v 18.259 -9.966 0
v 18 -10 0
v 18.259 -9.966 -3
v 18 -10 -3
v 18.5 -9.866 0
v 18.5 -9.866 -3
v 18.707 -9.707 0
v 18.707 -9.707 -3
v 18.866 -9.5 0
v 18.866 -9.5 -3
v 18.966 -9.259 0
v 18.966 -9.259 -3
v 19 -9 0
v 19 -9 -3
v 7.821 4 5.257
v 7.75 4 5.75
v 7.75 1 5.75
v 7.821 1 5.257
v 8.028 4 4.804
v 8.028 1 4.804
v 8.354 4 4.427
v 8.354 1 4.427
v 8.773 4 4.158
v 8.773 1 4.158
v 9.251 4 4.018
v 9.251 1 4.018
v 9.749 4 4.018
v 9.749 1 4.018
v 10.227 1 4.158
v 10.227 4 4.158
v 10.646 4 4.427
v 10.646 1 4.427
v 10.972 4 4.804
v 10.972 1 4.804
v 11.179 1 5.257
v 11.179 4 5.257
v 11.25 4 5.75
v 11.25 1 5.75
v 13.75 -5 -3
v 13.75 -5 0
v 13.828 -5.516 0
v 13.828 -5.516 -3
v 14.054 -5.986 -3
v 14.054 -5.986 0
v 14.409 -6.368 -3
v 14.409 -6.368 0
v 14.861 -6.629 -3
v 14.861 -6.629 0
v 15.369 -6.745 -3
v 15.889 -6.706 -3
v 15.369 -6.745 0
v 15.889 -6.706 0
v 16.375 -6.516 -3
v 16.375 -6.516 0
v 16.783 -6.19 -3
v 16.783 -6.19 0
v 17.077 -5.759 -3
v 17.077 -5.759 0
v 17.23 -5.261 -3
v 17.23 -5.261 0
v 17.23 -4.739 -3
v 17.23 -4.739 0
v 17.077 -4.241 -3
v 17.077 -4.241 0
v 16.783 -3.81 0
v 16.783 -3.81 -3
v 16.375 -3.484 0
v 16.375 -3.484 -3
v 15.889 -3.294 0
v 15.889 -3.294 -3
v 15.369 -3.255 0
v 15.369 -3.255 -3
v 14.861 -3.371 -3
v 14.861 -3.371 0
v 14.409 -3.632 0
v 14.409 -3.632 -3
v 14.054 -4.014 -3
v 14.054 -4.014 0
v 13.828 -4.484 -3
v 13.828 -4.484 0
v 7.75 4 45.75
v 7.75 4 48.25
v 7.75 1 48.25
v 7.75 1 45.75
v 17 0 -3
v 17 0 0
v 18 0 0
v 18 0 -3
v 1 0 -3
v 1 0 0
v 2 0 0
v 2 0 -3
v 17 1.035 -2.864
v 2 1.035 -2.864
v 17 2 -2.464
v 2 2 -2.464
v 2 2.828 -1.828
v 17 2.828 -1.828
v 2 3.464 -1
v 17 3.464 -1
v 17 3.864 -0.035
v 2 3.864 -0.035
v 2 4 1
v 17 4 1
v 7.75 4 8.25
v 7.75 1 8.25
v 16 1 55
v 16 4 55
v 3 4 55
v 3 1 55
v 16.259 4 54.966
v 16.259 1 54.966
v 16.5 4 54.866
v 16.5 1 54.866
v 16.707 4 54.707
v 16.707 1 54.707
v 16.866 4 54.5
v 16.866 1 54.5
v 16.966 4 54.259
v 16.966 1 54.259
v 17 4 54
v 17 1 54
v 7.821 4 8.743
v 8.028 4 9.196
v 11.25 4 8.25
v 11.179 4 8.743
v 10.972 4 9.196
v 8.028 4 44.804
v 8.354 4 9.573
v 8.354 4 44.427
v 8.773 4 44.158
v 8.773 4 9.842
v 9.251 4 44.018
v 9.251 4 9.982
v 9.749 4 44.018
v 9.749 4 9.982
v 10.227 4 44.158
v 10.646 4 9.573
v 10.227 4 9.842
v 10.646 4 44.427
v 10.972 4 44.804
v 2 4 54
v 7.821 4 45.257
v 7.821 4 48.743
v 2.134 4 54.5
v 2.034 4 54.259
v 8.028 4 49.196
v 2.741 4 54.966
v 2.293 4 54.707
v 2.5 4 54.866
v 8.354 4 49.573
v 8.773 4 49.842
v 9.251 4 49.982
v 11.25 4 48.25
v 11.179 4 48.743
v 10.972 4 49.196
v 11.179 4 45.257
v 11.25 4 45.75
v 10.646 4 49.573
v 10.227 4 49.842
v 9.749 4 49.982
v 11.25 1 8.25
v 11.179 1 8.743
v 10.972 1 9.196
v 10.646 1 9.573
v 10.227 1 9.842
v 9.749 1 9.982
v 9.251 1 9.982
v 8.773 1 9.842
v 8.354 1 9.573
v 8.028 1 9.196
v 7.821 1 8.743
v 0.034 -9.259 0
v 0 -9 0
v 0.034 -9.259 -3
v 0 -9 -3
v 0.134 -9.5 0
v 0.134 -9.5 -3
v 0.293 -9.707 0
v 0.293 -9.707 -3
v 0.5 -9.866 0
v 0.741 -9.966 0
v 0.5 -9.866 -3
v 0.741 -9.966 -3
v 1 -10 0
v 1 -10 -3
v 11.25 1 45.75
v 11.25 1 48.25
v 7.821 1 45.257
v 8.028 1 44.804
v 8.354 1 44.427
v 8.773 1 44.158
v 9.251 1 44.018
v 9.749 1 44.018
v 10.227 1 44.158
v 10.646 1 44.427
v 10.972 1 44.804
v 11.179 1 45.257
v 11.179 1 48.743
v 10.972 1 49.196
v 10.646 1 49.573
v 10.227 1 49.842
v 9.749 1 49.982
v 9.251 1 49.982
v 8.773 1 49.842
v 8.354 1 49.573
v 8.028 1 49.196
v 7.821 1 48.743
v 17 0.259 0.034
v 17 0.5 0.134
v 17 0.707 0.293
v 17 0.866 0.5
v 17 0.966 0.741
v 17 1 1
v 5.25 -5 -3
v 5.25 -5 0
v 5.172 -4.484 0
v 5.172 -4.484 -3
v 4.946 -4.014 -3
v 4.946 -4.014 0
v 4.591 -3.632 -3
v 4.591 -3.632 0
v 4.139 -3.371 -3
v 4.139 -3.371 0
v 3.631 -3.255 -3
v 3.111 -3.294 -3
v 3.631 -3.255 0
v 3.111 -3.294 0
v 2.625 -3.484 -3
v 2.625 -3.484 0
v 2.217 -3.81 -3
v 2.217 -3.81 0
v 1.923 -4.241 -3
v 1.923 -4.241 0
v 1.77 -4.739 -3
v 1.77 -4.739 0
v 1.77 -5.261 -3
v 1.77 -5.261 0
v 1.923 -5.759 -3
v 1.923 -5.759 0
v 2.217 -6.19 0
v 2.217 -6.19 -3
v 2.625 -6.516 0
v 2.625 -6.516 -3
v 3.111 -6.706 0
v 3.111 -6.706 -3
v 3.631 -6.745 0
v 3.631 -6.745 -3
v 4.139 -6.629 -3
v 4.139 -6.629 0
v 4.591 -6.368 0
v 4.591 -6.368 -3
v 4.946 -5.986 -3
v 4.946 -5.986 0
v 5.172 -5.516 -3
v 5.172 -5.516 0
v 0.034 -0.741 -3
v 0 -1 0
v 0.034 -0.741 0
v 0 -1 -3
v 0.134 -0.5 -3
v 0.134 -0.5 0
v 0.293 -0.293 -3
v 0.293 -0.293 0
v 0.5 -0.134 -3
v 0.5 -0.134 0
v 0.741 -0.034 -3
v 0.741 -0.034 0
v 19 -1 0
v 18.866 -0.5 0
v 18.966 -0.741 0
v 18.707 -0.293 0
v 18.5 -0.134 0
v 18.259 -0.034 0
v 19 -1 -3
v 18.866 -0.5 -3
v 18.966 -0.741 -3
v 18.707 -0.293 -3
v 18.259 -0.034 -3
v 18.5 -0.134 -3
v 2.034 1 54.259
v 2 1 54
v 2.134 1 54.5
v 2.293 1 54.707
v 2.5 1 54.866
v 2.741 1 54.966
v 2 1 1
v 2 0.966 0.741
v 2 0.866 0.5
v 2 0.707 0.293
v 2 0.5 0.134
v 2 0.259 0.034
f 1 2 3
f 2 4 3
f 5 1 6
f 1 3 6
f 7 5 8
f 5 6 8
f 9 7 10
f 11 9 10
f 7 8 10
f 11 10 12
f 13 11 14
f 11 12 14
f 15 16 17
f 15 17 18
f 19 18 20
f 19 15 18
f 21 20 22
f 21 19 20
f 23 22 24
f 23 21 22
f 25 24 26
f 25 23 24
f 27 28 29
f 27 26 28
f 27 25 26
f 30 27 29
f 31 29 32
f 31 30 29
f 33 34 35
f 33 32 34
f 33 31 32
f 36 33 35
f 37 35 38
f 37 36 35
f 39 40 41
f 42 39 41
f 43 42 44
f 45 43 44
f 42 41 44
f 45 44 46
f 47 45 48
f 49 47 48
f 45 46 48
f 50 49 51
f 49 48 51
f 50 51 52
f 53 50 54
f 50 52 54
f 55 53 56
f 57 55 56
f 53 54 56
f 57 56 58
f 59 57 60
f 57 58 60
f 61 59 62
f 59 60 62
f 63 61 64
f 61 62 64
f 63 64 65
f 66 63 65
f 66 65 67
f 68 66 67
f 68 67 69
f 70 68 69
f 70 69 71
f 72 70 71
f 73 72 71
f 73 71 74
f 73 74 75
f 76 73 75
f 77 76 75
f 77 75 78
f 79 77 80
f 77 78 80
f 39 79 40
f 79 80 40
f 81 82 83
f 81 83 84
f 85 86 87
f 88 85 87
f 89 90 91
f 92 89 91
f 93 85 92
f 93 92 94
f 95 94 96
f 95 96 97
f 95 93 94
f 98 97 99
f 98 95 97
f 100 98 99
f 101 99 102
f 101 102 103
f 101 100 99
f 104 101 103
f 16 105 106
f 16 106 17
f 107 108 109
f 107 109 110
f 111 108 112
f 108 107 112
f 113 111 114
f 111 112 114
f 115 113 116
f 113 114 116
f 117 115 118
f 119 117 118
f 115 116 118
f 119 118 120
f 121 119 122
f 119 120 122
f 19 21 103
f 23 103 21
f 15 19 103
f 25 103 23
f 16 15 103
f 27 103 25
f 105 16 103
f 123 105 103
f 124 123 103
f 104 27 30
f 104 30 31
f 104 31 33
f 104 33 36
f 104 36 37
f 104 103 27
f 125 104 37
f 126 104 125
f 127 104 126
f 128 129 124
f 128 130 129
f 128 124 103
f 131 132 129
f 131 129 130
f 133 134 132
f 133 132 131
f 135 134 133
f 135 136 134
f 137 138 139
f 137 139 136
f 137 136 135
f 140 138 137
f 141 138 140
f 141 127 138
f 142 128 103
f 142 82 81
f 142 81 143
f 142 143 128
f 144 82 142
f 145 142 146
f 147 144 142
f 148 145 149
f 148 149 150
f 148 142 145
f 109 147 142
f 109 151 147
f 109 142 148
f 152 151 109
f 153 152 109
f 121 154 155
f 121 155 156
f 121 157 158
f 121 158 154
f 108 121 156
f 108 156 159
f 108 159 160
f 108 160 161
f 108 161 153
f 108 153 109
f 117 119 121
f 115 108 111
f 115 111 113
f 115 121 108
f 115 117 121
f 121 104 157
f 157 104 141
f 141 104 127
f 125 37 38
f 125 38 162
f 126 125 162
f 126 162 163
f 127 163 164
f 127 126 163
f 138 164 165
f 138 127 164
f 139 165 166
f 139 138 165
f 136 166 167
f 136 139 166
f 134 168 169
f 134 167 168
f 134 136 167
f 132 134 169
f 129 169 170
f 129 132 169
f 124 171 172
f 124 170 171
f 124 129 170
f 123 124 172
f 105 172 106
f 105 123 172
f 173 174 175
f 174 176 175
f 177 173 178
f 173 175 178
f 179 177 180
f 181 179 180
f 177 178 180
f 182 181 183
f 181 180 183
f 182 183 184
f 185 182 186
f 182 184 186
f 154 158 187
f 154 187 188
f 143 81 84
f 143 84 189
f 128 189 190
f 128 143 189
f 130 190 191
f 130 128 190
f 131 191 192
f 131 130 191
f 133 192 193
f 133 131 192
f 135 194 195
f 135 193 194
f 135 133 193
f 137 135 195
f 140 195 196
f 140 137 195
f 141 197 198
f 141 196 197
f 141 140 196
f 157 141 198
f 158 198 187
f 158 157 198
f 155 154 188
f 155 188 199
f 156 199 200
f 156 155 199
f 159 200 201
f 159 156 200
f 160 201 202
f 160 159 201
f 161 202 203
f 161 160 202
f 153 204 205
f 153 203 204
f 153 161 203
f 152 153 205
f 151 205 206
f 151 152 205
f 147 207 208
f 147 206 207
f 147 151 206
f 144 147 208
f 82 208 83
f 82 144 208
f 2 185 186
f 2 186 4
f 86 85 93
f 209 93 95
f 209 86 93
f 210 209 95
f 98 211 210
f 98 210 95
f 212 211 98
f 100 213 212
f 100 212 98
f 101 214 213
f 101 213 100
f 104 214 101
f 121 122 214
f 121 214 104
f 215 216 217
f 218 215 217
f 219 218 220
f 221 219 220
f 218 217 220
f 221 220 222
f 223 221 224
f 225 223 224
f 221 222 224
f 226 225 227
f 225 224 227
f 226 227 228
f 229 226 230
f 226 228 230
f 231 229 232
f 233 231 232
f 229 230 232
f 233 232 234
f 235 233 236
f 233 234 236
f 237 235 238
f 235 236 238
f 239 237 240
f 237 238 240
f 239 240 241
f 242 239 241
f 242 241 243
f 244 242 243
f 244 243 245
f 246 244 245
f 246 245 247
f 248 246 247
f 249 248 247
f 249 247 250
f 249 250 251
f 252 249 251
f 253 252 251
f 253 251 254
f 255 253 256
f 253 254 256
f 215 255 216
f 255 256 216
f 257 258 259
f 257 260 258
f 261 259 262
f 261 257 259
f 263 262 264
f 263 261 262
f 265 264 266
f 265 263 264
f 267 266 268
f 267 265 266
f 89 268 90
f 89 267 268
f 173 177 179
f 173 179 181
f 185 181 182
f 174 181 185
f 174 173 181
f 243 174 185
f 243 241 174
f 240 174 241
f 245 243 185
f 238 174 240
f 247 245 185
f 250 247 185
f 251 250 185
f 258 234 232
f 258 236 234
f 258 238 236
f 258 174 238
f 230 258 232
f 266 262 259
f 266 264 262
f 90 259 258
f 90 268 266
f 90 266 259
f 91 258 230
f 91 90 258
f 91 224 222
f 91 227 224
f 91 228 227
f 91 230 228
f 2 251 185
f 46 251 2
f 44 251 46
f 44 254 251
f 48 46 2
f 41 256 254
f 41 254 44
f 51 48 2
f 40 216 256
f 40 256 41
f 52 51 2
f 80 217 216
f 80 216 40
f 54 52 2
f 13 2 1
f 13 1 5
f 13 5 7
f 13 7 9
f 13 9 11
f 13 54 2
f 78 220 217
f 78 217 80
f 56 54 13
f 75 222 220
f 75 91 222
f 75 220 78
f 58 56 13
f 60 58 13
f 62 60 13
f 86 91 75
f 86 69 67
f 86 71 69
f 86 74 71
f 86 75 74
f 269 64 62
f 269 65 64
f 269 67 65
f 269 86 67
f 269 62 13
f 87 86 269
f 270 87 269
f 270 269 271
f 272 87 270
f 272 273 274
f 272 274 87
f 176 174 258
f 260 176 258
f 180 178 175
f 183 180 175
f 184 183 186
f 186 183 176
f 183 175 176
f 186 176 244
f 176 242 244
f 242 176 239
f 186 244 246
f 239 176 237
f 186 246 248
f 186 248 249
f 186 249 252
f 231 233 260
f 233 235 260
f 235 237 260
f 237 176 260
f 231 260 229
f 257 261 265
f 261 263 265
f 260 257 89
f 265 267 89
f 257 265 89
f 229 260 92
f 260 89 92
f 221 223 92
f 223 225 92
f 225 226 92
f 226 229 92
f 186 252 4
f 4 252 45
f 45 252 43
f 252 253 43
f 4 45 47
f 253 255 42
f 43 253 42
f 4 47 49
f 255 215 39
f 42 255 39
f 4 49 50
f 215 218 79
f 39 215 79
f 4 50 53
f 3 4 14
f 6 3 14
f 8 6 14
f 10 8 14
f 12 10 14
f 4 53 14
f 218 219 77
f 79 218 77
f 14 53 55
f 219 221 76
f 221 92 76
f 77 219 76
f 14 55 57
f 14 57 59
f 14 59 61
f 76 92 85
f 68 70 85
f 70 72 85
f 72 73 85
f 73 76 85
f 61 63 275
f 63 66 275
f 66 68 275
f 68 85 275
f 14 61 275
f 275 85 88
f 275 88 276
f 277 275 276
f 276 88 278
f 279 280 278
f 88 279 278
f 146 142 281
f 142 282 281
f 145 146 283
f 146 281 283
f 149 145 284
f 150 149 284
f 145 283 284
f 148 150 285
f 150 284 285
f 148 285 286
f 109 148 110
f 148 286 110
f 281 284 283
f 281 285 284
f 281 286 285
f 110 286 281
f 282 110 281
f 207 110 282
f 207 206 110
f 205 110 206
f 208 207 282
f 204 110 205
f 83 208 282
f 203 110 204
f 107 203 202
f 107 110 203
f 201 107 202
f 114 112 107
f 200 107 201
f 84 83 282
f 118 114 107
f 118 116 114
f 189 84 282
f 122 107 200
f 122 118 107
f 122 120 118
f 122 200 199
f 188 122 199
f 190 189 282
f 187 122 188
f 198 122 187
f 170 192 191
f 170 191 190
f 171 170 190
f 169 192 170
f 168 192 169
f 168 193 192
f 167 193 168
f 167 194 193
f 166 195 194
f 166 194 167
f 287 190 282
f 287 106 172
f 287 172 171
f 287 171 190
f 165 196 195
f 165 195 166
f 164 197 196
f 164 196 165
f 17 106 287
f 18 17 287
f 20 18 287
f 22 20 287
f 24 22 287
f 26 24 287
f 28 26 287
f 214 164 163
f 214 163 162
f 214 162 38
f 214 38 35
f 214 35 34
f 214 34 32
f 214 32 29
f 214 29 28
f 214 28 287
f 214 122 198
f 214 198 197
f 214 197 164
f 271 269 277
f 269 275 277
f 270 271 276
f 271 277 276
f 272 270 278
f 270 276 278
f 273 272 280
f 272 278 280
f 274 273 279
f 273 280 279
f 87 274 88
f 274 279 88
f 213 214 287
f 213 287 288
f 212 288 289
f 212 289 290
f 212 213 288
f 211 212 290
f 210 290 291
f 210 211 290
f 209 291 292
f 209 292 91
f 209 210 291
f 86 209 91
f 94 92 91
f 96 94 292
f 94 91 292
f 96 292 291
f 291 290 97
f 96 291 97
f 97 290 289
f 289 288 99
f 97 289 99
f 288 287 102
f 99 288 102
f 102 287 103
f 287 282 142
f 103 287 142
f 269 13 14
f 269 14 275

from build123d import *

# Parameters (mm, degrees)
CROQUIS1_W             = 19
CROQUIS1_H             = 10
CROQUIS1_R             = 1.75
BRIDA_BASE1_DEPTH      = 3
BRIDA_DE_ARISTA1_DEPTH = 15
CORTAR_EXTRUIR1_REACH  = 61.85
REDONDEO1_R            = 1


# Sheet-metal steps are written as plain solids
with BuildPart() as part:
    # Croquis1 → Brida base1 (new body)
    with BuildSketch(Plane.XY):
        with Locations((9.5, -5)):
            Rectangle(CROQUIS1_W, CROQUIS1_H)
        with Locations((3.5, -5)):
            Circle(CROQUIS1_R, mode=Mode.SUBTRACT)
        with Locations(Location((15.5, -5, 0), (0, 0, 180))):
            Circle(CROQUIS1_R, mode=Mode.SUBTRACT)
    extrude(amount=-BRIDA_BASE1_DEPTH)

    # Brida de arista1 section (across the edge) → Brida de arista1 (add)
    with BuildSketch(Plane(origin=(17, 1, 0), x_dir=(0, -1, 0), z_dir=(-1, 0, 0))):
        with BuildLine():
            Line((-3, 1), (-3, 55))
            Line((-3, 55), (0, 55))
            Line((0, 55), (0, 1))
            ThreePointArc((0, 1), (0.292893219, 0.292893219), (1, 0))
            Line((1, 0), (1, -3))
            ThreePointArc((1, -3), (-1.828427125, -1.828427125), (-3, 1))
        make_face()
    extrude(amount=BRIDA_DE_ARISTA1_DEPTH)

    # Croquis9 → Cortar-Extruir1 (cut, up to next)
    with BuildSketch(Plane(origin=(0, 4, 0), x_dir=(1, 0, 0), z_dir=(0, 1, 0)), mode=Mode.PRIVATE) as cortar_extruir1_sk1:
        with BuildLine():
            Line((7.75, -8.25), (7.75, -5.75))
            ThreePointArc((7.75, -5.75), (9.5, -4), (11.25, -5.75))
            Line((11.25, -5.75), (11.25, -8.25))
            ThreePointArc((11.25, -8.25), (9.5, -10), (7.75, -8.25))
        make_face()
    cortar_extruir1_tool1 = extrude(cortar_extruir1_sk1.sketch, amount=-CORTAR_EXTRUIR1_REACH, mode=Mode.PRIVATE) & part.part
    # Croquis9 → Cortar-Extruir1 (cut, up to next)
    with BuildSketch(Plane(origin=(0, 4, 0), x_dir=(1, 0, 0), z_dir=(0, 1, 0)), mode=Mode.PRIVATE) as cortar_extruir1_sk2:
        with BuildLine():
            Line((7.75, -48.25), (7.75, -45.75))
            ThreePointArc((7.75, -45.75), (9.5, -44), (11.25, -45.75))
            Line((11.25, -45.75), (11.25, -48.25))
            ThreePointArc((11.25, -48.25), (9.5, -50), (7.75, -48.25))
        make_face()
    cortar_extruir1_tool2 = extrude(cortar_extruir1_sk2.sketch, amount=-CORTAR_EXTRUIR1_REACH, mode=Mode.PRIVATE) & part.part
    add(cortar_extruir1_tool1.solids().sort_by_distance((9.5, 4, 7))[0], mode=Mode.SUBTRACT)
    add(cortar_extruir1_tool2.solids().sort_by_distance((9.5, 4, 47))[0], mode=Mode.SUBTRACT)

    # Redondeo1
    redondeo1_edges = [part.edges().sort_by_distance(p)[0] for p in [
        (19, -10, -1.5),
        (0, -10, -1.5),
        (19, 0, -1.5),
        (0, 0, -1.5),
        (17, 2.5, 55),
        (2, 2.5, 55),
    ]]
    fillet(redondeo1_edges, radius=REDONDEO1_R)


solid = part.part
